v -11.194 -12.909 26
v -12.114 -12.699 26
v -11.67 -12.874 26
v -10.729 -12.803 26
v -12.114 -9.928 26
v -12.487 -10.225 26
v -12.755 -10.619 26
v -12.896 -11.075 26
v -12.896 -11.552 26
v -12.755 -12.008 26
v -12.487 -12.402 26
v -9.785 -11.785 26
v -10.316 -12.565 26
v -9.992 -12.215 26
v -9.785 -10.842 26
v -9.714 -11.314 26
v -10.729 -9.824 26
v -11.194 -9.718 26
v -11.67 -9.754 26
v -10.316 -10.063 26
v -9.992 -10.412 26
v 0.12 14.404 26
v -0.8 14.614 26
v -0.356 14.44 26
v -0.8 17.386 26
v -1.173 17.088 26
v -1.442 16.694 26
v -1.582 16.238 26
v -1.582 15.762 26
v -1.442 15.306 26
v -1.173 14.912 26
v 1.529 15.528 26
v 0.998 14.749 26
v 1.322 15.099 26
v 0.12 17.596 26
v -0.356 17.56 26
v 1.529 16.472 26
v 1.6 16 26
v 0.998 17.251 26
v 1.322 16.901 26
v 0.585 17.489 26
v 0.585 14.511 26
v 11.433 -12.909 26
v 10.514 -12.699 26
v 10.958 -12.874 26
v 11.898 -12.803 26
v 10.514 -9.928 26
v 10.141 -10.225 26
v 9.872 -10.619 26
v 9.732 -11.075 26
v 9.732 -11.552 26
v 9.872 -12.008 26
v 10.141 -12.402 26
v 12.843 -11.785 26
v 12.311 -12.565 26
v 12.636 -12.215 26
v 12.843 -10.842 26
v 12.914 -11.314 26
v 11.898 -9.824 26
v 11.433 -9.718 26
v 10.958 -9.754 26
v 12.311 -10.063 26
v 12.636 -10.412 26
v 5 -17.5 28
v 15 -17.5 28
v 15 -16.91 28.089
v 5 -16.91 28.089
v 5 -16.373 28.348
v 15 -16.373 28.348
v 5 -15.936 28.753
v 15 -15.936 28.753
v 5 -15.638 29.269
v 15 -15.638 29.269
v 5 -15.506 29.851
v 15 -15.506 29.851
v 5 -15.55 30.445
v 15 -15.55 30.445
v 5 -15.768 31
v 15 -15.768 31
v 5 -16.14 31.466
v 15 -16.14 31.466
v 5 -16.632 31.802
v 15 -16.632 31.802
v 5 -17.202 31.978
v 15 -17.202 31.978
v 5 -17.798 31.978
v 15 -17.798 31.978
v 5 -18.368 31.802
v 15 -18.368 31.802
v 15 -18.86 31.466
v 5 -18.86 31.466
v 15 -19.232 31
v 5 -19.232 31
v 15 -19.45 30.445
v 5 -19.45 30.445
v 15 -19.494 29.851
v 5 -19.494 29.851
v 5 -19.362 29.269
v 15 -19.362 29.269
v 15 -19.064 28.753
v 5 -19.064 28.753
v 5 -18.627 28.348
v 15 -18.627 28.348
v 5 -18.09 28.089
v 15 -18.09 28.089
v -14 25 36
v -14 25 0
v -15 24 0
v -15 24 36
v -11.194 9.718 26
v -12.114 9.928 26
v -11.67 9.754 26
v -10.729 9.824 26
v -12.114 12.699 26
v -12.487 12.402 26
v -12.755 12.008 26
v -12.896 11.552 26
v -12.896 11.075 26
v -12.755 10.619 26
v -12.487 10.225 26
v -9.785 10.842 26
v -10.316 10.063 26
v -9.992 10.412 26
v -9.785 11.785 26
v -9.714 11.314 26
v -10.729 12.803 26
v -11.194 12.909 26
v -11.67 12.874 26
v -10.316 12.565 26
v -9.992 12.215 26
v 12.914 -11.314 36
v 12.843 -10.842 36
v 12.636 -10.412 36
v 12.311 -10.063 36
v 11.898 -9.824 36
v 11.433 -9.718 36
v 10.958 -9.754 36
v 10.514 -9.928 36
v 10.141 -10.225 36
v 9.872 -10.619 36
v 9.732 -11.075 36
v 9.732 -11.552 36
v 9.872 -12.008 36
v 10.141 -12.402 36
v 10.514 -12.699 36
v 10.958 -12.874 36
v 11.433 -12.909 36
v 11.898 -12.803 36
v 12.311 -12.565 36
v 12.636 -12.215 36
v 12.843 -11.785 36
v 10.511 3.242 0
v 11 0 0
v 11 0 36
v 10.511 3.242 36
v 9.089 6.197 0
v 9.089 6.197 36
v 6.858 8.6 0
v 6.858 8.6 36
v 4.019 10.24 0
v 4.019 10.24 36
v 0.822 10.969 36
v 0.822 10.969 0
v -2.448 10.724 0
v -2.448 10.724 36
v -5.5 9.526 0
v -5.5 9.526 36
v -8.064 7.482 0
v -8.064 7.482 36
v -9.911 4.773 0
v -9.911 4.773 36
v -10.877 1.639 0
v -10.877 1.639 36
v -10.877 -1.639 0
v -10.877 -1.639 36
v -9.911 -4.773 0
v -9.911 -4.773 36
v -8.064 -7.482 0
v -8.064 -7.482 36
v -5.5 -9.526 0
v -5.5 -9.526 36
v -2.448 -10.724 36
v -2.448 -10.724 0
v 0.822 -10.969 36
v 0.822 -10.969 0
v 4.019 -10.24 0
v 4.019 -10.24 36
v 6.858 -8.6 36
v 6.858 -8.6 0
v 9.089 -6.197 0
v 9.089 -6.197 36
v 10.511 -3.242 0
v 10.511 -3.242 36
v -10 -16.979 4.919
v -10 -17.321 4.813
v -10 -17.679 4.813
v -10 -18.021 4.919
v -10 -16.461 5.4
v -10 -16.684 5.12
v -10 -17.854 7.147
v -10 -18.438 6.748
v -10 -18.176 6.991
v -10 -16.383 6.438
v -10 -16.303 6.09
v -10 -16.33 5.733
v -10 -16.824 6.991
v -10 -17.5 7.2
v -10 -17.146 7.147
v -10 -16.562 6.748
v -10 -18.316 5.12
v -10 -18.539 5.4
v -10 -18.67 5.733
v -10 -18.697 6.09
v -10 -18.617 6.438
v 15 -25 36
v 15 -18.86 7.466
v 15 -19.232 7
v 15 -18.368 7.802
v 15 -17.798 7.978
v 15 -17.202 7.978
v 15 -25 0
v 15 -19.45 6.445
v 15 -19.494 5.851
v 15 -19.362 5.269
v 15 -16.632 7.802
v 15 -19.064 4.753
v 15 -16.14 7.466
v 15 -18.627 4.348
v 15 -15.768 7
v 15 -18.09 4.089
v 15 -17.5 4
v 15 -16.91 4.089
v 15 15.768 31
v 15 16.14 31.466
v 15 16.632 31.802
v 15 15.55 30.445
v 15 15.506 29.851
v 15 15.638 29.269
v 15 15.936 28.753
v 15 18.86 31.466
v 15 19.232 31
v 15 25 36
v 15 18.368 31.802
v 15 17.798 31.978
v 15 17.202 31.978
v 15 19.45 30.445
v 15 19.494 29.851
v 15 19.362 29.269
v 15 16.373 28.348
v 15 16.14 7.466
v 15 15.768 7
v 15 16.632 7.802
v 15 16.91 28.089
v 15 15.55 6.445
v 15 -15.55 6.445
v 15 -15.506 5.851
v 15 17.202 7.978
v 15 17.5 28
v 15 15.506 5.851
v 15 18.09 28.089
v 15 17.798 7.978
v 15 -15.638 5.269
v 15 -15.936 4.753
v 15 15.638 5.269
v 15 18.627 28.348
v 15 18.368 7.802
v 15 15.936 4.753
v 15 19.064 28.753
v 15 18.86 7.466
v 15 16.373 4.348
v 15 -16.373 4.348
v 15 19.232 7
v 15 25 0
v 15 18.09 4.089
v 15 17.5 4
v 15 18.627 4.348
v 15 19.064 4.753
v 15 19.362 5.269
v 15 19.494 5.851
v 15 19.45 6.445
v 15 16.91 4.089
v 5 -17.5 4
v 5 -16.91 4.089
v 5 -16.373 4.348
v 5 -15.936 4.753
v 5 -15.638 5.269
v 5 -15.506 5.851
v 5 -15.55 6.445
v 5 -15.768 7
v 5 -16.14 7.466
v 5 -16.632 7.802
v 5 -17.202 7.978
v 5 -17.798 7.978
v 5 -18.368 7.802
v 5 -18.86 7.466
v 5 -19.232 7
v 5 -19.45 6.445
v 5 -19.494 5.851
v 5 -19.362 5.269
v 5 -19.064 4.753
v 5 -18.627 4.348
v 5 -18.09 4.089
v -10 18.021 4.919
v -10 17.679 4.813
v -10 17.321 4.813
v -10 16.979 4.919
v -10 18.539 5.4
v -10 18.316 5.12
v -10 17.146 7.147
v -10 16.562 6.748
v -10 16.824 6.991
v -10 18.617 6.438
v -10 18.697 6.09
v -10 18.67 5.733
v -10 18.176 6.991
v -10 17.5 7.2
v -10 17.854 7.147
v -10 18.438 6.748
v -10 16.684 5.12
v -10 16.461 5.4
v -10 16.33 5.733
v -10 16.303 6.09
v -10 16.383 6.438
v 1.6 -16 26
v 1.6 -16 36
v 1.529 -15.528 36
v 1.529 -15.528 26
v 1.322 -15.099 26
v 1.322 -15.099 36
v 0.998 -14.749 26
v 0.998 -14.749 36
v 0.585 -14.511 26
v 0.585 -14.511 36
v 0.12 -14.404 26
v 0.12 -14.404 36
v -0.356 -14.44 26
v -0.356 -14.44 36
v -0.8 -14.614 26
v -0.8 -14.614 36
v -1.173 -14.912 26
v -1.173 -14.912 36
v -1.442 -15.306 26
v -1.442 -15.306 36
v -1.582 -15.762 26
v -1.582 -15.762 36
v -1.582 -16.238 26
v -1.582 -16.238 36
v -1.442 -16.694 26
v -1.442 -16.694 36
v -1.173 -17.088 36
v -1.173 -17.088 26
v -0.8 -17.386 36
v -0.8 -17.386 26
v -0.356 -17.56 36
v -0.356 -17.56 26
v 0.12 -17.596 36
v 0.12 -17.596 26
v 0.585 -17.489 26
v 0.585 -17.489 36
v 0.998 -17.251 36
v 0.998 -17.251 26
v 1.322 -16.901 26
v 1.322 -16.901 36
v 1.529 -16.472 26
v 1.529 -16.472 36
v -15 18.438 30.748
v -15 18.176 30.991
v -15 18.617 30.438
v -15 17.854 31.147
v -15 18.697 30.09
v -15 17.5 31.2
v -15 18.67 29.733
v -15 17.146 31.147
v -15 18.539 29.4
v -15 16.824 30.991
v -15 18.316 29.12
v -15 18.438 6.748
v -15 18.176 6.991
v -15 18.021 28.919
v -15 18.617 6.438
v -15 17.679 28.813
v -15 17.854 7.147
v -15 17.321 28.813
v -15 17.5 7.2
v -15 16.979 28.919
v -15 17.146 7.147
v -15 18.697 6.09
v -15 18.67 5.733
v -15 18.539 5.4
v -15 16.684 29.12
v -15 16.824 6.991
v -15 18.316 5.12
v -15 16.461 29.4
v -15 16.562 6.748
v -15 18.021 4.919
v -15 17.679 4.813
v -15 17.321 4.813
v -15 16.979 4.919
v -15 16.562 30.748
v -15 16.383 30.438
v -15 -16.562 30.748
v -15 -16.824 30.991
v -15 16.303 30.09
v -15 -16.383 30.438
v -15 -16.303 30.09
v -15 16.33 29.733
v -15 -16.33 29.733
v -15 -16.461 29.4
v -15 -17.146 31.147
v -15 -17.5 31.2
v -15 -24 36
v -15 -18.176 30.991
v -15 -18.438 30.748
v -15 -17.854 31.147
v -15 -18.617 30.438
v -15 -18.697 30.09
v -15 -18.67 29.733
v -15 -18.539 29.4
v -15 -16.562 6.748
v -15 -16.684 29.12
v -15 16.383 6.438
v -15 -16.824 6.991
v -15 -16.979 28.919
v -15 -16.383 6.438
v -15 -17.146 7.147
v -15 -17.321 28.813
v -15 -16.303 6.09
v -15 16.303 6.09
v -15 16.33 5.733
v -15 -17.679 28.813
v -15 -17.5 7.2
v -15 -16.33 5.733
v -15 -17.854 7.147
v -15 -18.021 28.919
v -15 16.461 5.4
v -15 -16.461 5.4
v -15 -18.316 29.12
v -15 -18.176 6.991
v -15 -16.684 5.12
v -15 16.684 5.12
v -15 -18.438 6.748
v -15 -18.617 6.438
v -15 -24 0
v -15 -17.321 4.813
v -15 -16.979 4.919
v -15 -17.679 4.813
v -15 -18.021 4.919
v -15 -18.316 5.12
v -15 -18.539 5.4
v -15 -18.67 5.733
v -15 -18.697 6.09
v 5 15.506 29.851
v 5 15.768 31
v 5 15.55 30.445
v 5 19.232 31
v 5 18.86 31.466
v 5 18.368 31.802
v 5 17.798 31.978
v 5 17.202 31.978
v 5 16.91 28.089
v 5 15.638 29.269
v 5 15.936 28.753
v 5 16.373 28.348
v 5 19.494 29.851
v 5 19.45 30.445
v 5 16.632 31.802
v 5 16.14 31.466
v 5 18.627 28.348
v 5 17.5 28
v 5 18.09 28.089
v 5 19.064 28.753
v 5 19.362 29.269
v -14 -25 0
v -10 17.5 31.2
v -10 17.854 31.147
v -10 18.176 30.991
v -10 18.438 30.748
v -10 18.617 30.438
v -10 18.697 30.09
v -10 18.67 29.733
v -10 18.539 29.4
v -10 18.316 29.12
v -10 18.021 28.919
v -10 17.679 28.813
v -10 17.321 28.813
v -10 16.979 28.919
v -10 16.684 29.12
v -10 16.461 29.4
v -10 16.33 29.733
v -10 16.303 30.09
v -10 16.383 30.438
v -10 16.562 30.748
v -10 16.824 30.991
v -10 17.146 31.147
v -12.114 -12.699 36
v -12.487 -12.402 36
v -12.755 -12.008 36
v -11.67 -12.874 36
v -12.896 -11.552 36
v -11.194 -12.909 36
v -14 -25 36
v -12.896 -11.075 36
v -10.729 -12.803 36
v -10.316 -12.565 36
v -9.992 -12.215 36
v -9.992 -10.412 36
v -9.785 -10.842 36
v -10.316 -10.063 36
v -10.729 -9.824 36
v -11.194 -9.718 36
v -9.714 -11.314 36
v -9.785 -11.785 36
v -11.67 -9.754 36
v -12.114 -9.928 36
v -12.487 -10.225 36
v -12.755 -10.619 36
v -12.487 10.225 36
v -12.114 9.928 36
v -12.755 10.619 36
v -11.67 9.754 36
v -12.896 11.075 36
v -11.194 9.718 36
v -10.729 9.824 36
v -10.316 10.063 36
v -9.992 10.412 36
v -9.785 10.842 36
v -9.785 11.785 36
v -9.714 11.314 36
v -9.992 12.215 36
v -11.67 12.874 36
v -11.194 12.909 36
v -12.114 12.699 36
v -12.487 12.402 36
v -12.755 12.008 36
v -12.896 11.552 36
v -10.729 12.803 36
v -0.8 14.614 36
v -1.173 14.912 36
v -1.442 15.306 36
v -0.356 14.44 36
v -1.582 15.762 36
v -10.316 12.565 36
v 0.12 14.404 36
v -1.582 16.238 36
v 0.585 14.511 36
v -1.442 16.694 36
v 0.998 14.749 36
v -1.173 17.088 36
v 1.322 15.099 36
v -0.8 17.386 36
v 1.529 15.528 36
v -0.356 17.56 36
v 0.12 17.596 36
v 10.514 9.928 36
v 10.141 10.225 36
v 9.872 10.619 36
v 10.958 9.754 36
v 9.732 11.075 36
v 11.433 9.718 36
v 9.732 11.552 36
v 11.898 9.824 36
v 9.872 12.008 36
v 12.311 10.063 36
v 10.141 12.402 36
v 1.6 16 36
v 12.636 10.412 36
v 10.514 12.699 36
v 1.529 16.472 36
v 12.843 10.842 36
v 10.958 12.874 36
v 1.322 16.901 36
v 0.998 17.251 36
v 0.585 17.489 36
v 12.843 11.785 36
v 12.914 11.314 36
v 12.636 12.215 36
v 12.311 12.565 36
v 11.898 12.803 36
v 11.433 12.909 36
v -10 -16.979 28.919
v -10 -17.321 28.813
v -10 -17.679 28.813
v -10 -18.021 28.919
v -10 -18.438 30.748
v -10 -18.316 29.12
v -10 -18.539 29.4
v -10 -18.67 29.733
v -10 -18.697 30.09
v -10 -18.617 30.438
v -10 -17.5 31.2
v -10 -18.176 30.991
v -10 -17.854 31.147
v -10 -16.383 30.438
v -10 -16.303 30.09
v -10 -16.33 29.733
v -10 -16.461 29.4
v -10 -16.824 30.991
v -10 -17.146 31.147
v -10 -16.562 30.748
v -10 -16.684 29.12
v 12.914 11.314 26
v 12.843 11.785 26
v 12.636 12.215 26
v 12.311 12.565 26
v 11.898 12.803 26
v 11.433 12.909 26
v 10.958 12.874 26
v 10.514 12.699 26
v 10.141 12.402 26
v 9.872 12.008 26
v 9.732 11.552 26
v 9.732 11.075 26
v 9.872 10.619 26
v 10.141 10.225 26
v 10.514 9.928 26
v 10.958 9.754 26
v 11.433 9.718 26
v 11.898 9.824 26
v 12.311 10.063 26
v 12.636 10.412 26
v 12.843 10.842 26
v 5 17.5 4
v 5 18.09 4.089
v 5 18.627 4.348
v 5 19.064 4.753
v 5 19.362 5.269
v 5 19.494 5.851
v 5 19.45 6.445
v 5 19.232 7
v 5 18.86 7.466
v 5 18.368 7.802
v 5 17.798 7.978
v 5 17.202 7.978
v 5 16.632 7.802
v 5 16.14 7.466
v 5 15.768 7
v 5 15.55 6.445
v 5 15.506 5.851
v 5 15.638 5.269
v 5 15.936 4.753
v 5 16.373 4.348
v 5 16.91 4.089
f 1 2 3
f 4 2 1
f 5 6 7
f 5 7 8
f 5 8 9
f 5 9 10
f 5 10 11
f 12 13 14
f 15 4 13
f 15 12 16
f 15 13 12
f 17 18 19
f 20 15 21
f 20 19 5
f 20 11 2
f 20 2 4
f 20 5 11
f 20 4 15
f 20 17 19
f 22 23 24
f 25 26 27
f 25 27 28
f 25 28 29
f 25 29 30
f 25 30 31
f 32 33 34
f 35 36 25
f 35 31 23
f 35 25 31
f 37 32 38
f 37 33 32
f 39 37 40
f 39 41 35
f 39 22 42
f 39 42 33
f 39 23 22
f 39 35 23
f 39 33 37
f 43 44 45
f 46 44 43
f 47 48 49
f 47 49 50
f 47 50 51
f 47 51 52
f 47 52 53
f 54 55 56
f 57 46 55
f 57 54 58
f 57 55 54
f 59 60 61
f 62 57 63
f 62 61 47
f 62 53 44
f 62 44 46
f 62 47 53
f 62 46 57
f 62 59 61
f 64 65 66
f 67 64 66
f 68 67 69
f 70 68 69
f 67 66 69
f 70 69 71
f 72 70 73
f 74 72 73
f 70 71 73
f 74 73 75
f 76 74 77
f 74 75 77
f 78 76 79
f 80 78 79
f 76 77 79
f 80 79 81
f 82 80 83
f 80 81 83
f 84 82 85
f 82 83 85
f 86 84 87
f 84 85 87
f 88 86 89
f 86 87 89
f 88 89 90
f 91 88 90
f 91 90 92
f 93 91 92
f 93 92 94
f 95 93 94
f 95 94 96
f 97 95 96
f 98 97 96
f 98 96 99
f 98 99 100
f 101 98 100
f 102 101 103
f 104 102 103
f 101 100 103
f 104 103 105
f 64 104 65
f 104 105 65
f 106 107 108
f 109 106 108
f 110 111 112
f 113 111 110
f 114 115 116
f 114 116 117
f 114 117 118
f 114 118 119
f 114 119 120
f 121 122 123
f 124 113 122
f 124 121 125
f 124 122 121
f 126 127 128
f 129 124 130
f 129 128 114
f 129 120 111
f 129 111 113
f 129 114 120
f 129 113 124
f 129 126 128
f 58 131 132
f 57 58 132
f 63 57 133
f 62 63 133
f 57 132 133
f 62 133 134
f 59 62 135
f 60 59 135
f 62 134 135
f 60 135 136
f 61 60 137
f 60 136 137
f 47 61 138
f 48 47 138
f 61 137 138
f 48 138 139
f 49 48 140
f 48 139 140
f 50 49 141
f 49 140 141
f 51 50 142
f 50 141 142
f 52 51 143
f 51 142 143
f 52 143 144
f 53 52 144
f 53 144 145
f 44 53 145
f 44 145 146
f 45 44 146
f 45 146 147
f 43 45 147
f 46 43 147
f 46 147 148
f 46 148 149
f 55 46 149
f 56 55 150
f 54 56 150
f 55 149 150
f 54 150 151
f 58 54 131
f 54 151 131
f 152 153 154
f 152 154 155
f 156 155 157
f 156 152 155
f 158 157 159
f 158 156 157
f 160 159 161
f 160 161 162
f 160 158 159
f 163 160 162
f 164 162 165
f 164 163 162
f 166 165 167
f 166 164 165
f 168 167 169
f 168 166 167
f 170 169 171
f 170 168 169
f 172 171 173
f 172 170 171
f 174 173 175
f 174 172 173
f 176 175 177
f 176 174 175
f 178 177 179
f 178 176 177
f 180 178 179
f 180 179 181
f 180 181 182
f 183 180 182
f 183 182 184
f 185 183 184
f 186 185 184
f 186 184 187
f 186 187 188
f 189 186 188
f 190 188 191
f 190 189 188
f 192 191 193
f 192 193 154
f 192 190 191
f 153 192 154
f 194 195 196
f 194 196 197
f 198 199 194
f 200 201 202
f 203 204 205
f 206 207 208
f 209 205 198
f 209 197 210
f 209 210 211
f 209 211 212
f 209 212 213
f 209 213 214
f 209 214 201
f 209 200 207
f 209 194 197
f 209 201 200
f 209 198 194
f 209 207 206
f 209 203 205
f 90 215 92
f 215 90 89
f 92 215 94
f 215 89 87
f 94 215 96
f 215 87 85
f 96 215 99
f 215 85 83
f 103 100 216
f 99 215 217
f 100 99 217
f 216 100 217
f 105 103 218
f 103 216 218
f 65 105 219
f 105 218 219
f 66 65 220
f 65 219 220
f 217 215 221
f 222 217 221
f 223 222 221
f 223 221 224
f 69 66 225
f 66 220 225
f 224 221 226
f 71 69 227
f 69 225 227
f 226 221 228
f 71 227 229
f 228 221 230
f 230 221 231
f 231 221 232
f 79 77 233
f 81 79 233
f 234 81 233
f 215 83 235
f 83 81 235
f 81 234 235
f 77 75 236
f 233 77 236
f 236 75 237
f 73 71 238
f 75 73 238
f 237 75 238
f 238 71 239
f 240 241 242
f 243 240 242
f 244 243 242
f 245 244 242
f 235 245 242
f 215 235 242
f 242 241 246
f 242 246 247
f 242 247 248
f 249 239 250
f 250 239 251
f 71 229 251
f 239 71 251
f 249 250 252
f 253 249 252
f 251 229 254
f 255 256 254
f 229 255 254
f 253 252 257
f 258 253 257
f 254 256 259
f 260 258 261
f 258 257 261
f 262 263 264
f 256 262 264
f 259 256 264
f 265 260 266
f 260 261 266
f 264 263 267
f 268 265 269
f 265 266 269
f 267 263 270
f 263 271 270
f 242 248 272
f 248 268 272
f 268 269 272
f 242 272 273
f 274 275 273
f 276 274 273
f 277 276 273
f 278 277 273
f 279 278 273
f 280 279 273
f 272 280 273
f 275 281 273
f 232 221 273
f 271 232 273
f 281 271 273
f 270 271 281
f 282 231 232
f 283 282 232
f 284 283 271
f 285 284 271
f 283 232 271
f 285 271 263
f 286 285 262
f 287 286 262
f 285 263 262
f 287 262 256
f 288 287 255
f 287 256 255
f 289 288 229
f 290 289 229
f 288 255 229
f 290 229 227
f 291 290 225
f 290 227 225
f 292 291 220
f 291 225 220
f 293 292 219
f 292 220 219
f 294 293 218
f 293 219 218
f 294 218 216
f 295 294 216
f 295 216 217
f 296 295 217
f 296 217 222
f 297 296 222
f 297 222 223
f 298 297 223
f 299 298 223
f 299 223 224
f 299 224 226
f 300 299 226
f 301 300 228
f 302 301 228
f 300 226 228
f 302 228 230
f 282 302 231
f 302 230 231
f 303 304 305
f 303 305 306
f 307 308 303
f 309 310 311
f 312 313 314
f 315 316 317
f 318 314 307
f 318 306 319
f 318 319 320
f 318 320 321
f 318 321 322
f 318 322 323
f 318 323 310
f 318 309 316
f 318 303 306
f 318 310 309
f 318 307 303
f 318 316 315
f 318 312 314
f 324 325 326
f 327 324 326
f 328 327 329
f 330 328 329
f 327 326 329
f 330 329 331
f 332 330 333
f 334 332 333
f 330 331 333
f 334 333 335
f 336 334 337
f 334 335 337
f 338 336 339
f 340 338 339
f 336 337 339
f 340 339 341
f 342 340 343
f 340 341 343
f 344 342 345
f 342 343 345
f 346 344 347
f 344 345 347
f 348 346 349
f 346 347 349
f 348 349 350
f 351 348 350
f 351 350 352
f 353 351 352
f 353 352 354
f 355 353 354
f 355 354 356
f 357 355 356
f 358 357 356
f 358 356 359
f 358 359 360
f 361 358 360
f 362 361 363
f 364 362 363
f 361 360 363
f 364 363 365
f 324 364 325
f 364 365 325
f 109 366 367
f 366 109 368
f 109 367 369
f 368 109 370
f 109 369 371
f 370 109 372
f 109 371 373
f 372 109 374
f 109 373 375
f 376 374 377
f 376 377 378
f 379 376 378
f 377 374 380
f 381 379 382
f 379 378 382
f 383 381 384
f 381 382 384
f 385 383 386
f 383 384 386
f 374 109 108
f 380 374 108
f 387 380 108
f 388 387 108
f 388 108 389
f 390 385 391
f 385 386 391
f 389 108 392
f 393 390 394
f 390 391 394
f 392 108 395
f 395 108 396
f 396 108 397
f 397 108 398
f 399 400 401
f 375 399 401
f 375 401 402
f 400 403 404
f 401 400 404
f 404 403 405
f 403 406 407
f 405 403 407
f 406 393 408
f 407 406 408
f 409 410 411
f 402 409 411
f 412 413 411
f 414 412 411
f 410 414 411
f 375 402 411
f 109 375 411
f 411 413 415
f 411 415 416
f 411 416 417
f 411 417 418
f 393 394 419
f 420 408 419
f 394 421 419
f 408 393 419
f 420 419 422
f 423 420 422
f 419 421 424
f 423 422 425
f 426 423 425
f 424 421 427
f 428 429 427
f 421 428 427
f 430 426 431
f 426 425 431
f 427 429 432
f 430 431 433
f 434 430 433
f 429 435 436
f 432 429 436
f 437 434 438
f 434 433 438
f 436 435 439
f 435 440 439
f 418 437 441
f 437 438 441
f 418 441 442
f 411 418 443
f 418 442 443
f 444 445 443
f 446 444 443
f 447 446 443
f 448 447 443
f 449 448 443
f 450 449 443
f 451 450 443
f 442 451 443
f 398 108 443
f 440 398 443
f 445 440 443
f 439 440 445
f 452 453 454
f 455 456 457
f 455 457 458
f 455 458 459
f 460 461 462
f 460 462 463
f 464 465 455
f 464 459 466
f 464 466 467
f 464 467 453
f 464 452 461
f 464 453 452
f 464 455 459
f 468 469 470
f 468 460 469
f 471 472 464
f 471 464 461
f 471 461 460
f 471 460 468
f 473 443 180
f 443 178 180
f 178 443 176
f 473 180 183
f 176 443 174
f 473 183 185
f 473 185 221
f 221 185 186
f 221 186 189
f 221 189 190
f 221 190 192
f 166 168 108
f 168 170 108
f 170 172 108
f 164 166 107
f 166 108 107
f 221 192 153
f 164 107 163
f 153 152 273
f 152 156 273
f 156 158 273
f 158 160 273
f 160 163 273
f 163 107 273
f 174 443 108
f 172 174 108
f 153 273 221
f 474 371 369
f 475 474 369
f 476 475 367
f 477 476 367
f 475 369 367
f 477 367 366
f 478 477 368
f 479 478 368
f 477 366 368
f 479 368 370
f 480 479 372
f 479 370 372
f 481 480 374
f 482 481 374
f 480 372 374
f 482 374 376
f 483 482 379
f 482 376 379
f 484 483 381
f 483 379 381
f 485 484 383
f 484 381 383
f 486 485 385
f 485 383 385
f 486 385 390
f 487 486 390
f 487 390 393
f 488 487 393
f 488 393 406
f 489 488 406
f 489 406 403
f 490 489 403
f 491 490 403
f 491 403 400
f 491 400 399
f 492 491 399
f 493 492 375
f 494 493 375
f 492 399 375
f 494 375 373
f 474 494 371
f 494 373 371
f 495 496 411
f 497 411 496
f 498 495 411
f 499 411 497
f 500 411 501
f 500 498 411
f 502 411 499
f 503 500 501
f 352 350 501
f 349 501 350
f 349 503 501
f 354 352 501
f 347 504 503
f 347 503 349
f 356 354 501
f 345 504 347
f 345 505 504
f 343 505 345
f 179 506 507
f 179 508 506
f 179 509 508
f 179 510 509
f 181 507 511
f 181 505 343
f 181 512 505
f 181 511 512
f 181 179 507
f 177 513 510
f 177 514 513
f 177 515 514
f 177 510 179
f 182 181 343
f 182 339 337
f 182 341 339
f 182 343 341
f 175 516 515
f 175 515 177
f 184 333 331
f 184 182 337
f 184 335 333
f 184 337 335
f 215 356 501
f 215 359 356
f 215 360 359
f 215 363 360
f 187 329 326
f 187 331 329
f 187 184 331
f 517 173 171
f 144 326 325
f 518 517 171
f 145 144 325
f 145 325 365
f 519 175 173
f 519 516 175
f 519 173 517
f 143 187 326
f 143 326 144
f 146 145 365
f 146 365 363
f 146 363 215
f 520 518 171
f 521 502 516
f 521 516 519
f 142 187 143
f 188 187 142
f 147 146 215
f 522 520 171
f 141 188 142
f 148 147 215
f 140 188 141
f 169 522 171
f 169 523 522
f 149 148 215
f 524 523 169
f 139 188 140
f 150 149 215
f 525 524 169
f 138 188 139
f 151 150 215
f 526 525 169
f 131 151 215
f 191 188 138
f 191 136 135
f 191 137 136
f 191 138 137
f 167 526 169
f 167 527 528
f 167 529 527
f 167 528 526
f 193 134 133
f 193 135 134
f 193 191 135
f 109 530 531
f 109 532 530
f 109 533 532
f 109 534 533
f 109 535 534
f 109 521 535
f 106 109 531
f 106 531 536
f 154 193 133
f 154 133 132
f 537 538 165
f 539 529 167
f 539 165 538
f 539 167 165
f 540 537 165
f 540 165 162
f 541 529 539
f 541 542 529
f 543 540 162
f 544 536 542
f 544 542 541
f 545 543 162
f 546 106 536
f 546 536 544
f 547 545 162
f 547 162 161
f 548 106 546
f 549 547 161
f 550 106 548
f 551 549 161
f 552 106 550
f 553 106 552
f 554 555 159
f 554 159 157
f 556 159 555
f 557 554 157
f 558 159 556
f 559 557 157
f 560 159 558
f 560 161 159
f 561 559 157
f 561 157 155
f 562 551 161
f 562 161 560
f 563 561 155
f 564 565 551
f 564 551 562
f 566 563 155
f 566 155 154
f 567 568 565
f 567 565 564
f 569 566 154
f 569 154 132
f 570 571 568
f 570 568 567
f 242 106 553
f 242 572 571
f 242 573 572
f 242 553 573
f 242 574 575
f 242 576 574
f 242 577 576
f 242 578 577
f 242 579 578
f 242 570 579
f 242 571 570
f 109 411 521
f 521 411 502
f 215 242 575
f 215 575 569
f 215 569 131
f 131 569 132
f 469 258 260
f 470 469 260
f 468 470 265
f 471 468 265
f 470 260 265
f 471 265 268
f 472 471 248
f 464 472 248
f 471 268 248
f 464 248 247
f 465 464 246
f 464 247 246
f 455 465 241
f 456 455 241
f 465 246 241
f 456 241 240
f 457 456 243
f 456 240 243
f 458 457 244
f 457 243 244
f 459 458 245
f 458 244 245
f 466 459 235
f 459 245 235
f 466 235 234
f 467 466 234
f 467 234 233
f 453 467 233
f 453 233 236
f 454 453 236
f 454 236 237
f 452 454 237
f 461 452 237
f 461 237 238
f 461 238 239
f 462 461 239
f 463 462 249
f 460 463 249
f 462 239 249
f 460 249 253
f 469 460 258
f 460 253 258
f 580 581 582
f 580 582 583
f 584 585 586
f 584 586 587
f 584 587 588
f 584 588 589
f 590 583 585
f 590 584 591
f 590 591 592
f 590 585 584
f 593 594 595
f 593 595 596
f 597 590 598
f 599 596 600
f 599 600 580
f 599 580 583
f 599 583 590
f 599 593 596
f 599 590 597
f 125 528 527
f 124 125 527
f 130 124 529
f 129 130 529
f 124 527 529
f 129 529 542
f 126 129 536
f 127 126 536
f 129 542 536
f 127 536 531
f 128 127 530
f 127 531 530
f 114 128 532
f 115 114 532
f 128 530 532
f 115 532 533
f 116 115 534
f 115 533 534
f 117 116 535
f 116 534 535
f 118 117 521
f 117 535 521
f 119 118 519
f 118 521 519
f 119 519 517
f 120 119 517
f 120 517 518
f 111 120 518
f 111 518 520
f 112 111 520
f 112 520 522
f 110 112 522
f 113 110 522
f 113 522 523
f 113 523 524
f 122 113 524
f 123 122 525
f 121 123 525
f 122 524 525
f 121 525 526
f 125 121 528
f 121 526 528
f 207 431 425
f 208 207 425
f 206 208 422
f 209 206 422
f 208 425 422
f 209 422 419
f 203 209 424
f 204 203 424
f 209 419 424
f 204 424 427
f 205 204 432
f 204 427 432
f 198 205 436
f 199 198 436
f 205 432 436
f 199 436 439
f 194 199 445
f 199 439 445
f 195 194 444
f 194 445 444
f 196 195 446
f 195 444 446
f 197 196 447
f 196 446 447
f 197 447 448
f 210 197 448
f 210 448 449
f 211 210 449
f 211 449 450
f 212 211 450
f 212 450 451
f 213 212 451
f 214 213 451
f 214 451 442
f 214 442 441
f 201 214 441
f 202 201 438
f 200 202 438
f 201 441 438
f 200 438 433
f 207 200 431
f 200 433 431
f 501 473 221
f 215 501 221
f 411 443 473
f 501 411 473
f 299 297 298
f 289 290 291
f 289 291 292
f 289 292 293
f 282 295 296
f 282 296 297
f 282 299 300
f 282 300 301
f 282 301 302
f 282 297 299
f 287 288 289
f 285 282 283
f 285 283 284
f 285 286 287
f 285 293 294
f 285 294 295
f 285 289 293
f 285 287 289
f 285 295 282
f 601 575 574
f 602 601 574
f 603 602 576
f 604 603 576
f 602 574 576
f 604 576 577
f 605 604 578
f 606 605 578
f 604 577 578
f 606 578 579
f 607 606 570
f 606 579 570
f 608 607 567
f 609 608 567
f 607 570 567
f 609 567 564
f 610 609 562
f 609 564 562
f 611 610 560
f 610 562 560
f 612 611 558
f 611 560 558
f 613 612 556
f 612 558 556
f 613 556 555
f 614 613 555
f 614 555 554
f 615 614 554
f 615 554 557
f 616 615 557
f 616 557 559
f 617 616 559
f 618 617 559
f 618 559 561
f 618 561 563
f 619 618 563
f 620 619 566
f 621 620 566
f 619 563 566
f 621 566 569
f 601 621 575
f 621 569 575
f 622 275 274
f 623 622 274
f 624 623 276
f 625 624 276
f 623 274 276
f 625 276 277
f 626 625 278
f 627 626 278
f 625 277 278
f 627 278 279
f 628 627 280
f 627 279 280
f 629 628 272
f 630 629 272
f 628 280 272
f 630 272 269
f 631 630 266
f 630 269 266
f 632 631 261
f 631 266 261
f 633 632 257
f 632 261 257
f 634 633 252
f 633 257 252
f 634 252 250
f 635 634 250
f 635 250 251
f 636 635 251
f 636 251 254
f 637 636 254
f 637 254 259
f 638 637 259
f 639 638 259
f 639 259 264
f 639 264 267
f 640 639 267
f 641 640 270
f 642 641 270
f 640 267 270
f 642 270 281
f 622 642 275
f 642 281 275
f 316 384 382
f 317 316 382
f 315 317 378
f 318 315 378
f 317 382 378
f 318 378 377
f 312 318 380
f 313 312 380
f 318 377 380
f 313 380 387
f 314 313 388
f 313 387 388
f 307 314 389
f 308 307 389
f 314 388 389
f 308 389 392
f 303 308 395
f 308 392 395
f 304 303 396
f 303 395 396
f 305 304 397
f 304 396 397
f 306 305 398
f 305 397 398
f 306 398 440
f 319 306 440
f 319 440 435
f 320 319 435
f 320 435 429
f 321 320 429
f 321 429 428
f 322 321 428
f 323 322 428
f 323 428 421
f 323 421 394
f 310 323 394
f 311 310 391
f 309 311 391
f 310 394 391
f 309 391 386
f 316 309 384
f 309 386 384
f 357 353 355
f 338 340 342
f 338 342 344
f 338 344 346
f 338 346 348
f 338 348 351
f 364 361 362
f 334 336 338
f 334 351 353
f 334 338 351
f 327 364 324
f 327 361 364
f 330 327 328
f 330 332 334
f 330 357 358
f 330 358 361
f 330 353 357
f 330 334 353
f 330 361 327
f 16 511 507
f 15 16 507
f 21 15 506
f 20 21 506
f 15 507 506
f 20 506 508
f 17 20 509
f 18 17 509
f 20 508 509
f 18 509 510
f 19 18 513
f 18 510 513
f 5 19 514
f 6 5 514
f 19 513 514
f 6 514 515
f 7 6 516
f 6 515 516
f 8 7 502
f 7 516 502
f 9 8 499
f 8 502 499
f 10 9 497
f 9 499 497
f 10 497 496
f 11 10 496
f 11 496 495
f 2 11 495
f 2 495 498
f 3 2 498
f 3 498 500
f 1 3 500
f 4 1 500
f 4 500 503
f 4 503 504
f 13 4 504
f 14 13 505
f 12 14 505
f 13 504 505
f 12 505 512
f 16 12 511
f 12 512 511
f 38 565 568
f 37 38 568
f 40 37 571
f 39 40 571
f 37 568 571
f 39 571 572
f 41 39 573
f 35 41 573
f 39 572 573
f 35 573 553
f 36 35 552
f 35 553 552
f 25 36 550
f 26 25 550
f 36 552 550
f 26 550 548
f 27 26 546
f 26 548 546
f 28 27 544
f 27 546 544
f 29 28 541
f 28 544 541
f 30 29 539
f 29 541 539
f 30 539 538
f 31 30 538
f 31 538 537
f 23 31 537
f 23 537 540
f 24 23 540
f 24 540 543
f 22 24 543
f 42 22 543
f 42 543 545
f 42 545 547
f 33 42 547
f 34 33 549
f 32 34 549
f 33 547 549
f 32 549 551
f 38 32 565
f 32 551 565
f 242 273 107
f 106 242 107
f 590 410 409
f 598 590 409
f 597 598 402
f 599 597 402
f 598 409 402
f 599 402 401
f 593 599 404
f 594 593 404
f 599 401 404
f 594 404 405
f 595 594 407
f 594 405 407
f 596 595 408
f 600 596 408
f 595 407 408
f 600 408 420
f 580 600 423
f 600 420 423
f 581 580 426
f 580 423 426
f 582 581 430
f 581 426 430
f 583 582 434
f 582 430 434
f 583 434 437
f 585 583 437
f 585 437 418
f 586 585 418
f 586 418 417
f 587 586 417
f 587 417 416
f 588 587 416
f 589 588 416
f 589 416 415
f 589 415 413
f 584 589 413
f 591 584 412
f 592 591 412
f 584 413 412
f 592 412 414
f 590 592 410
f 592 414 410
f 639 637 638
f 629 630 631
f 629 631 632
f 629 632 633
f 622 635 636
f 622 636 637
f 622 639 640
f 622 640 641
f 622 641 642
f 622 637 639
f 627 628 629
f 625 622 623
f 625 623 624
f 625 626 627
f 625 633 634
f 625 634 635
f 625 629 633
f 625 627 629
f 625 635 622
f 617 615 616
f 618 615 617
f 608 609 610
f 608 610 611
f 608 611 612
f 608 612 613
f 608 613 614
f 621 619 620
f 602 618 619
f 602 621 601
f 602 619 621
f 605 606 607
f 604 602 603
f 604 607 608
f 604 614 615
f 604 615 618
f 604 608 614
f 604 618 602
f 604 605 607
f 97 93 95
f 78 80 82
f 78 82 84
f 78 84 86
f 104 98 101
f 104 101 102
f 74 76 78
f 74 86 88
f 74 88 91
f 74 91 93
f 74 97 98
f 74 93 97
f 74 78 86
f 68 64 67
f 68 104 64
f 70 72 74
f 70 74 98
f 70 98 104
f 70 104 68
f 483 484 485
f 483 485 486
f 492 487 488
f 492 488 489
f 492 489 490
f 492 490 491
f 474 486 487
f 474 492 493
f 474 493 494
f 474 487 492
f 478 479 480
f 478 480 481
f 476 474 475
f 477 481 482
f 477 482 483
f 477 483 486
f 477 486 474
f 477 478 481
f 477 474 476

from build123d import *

# Parameters (mm, degrees)
SKETCH_4_R          = 11
EXTRUDE_2_DEPTH     = 36
SKETCH_5_R          = 1.6
CUT_EXTRUDE_2_DEPTH = 10
SKETCH_6_R          = 2
CUT_EXTRUDE_3_DEPTH = 10
SKETCH_9_R          = 1.2
CUT_EXTRUDE_5_DEPTH = 5


with BuildPart() as part:
    # 草图4 → 凸台-拉伸2 (new body)
    with BuildSketch(Plane.XY):
        Polygon((15, 25), (-14, 25), (-15, 24), (-15, -24), (-14, -25), (15, -25), align=None)
        Circle(SKETCH_4_R, mode=Mode.SUBTRACT)
    extrude(amount=EXTRUDE_2_DEPTH)

    # 草图5 → 切除-拉伸2 (cut)
    with BuildSketch(Plane.XY.offset(36)):
        with Locations((0, 16)):
            Circle(SKETCH_5_R)
        with Locations((11.313708499, 11.313708499)):
            Circle(SKETCH_5_R)
        with Locations((11.313708499, -11.313708499)):
            Circle(SKETCH_5_R)
        with Locations((0, -16)):
            Circle(SKETCH_5_R)
        with Locations((-11.313708499, -11.313708499)):
            Circle(SKETCH_5_R)
        with Locations((-11.313708499, 11.313708499)):
            Circle(SKETCH_5_R)
    extrude(amount=-CUT_EXTRUDE_2_DEPTH, mode=Mode.SUBTRACT)

    # 草图6 → 切除-拉伸3 (cut)
    with BuildSketch(Plane(origin=(15, 0, 0), x_dir=(0, 0, -1), z_dir=(1, 0, 0))):
        with Locations((-6, 17.5)):
            Circle(SKETCH_6_R)
        with Locations((-30, 17.5)):
            Circle(SKETCH_6_R)
        with Locations((-30, -17.5)):
            Circle(SKETCH_6_R)
        with Locations((-6, -17.5)):
            Circle(SKETCH_6_R)
    extrude(amount=-CUT_EXTRUDE_3_DEPTH, mode=Mode.SUBTRACT)

    # 草图9 → 切除-拉伸5 (cut)
    with BuildSketch(Plane.ZY.offset(15)):
        with Locations((6, 17.5)):
            Circle(SKETCH_9_R)
        with Locations((30, 17.5)):
            Circle(SKETCH_9_R)
        with Locations((6, -17.5)):
            Circle(SKETCH_9_R)
        with Locations((30, -17.5)):
            Circle(SKETCH_9_R)
    extrude(amount=-CUT_EXTRUDE_5_DEPTH, mode=Mode.SUBTRACT)


solid = part.part
